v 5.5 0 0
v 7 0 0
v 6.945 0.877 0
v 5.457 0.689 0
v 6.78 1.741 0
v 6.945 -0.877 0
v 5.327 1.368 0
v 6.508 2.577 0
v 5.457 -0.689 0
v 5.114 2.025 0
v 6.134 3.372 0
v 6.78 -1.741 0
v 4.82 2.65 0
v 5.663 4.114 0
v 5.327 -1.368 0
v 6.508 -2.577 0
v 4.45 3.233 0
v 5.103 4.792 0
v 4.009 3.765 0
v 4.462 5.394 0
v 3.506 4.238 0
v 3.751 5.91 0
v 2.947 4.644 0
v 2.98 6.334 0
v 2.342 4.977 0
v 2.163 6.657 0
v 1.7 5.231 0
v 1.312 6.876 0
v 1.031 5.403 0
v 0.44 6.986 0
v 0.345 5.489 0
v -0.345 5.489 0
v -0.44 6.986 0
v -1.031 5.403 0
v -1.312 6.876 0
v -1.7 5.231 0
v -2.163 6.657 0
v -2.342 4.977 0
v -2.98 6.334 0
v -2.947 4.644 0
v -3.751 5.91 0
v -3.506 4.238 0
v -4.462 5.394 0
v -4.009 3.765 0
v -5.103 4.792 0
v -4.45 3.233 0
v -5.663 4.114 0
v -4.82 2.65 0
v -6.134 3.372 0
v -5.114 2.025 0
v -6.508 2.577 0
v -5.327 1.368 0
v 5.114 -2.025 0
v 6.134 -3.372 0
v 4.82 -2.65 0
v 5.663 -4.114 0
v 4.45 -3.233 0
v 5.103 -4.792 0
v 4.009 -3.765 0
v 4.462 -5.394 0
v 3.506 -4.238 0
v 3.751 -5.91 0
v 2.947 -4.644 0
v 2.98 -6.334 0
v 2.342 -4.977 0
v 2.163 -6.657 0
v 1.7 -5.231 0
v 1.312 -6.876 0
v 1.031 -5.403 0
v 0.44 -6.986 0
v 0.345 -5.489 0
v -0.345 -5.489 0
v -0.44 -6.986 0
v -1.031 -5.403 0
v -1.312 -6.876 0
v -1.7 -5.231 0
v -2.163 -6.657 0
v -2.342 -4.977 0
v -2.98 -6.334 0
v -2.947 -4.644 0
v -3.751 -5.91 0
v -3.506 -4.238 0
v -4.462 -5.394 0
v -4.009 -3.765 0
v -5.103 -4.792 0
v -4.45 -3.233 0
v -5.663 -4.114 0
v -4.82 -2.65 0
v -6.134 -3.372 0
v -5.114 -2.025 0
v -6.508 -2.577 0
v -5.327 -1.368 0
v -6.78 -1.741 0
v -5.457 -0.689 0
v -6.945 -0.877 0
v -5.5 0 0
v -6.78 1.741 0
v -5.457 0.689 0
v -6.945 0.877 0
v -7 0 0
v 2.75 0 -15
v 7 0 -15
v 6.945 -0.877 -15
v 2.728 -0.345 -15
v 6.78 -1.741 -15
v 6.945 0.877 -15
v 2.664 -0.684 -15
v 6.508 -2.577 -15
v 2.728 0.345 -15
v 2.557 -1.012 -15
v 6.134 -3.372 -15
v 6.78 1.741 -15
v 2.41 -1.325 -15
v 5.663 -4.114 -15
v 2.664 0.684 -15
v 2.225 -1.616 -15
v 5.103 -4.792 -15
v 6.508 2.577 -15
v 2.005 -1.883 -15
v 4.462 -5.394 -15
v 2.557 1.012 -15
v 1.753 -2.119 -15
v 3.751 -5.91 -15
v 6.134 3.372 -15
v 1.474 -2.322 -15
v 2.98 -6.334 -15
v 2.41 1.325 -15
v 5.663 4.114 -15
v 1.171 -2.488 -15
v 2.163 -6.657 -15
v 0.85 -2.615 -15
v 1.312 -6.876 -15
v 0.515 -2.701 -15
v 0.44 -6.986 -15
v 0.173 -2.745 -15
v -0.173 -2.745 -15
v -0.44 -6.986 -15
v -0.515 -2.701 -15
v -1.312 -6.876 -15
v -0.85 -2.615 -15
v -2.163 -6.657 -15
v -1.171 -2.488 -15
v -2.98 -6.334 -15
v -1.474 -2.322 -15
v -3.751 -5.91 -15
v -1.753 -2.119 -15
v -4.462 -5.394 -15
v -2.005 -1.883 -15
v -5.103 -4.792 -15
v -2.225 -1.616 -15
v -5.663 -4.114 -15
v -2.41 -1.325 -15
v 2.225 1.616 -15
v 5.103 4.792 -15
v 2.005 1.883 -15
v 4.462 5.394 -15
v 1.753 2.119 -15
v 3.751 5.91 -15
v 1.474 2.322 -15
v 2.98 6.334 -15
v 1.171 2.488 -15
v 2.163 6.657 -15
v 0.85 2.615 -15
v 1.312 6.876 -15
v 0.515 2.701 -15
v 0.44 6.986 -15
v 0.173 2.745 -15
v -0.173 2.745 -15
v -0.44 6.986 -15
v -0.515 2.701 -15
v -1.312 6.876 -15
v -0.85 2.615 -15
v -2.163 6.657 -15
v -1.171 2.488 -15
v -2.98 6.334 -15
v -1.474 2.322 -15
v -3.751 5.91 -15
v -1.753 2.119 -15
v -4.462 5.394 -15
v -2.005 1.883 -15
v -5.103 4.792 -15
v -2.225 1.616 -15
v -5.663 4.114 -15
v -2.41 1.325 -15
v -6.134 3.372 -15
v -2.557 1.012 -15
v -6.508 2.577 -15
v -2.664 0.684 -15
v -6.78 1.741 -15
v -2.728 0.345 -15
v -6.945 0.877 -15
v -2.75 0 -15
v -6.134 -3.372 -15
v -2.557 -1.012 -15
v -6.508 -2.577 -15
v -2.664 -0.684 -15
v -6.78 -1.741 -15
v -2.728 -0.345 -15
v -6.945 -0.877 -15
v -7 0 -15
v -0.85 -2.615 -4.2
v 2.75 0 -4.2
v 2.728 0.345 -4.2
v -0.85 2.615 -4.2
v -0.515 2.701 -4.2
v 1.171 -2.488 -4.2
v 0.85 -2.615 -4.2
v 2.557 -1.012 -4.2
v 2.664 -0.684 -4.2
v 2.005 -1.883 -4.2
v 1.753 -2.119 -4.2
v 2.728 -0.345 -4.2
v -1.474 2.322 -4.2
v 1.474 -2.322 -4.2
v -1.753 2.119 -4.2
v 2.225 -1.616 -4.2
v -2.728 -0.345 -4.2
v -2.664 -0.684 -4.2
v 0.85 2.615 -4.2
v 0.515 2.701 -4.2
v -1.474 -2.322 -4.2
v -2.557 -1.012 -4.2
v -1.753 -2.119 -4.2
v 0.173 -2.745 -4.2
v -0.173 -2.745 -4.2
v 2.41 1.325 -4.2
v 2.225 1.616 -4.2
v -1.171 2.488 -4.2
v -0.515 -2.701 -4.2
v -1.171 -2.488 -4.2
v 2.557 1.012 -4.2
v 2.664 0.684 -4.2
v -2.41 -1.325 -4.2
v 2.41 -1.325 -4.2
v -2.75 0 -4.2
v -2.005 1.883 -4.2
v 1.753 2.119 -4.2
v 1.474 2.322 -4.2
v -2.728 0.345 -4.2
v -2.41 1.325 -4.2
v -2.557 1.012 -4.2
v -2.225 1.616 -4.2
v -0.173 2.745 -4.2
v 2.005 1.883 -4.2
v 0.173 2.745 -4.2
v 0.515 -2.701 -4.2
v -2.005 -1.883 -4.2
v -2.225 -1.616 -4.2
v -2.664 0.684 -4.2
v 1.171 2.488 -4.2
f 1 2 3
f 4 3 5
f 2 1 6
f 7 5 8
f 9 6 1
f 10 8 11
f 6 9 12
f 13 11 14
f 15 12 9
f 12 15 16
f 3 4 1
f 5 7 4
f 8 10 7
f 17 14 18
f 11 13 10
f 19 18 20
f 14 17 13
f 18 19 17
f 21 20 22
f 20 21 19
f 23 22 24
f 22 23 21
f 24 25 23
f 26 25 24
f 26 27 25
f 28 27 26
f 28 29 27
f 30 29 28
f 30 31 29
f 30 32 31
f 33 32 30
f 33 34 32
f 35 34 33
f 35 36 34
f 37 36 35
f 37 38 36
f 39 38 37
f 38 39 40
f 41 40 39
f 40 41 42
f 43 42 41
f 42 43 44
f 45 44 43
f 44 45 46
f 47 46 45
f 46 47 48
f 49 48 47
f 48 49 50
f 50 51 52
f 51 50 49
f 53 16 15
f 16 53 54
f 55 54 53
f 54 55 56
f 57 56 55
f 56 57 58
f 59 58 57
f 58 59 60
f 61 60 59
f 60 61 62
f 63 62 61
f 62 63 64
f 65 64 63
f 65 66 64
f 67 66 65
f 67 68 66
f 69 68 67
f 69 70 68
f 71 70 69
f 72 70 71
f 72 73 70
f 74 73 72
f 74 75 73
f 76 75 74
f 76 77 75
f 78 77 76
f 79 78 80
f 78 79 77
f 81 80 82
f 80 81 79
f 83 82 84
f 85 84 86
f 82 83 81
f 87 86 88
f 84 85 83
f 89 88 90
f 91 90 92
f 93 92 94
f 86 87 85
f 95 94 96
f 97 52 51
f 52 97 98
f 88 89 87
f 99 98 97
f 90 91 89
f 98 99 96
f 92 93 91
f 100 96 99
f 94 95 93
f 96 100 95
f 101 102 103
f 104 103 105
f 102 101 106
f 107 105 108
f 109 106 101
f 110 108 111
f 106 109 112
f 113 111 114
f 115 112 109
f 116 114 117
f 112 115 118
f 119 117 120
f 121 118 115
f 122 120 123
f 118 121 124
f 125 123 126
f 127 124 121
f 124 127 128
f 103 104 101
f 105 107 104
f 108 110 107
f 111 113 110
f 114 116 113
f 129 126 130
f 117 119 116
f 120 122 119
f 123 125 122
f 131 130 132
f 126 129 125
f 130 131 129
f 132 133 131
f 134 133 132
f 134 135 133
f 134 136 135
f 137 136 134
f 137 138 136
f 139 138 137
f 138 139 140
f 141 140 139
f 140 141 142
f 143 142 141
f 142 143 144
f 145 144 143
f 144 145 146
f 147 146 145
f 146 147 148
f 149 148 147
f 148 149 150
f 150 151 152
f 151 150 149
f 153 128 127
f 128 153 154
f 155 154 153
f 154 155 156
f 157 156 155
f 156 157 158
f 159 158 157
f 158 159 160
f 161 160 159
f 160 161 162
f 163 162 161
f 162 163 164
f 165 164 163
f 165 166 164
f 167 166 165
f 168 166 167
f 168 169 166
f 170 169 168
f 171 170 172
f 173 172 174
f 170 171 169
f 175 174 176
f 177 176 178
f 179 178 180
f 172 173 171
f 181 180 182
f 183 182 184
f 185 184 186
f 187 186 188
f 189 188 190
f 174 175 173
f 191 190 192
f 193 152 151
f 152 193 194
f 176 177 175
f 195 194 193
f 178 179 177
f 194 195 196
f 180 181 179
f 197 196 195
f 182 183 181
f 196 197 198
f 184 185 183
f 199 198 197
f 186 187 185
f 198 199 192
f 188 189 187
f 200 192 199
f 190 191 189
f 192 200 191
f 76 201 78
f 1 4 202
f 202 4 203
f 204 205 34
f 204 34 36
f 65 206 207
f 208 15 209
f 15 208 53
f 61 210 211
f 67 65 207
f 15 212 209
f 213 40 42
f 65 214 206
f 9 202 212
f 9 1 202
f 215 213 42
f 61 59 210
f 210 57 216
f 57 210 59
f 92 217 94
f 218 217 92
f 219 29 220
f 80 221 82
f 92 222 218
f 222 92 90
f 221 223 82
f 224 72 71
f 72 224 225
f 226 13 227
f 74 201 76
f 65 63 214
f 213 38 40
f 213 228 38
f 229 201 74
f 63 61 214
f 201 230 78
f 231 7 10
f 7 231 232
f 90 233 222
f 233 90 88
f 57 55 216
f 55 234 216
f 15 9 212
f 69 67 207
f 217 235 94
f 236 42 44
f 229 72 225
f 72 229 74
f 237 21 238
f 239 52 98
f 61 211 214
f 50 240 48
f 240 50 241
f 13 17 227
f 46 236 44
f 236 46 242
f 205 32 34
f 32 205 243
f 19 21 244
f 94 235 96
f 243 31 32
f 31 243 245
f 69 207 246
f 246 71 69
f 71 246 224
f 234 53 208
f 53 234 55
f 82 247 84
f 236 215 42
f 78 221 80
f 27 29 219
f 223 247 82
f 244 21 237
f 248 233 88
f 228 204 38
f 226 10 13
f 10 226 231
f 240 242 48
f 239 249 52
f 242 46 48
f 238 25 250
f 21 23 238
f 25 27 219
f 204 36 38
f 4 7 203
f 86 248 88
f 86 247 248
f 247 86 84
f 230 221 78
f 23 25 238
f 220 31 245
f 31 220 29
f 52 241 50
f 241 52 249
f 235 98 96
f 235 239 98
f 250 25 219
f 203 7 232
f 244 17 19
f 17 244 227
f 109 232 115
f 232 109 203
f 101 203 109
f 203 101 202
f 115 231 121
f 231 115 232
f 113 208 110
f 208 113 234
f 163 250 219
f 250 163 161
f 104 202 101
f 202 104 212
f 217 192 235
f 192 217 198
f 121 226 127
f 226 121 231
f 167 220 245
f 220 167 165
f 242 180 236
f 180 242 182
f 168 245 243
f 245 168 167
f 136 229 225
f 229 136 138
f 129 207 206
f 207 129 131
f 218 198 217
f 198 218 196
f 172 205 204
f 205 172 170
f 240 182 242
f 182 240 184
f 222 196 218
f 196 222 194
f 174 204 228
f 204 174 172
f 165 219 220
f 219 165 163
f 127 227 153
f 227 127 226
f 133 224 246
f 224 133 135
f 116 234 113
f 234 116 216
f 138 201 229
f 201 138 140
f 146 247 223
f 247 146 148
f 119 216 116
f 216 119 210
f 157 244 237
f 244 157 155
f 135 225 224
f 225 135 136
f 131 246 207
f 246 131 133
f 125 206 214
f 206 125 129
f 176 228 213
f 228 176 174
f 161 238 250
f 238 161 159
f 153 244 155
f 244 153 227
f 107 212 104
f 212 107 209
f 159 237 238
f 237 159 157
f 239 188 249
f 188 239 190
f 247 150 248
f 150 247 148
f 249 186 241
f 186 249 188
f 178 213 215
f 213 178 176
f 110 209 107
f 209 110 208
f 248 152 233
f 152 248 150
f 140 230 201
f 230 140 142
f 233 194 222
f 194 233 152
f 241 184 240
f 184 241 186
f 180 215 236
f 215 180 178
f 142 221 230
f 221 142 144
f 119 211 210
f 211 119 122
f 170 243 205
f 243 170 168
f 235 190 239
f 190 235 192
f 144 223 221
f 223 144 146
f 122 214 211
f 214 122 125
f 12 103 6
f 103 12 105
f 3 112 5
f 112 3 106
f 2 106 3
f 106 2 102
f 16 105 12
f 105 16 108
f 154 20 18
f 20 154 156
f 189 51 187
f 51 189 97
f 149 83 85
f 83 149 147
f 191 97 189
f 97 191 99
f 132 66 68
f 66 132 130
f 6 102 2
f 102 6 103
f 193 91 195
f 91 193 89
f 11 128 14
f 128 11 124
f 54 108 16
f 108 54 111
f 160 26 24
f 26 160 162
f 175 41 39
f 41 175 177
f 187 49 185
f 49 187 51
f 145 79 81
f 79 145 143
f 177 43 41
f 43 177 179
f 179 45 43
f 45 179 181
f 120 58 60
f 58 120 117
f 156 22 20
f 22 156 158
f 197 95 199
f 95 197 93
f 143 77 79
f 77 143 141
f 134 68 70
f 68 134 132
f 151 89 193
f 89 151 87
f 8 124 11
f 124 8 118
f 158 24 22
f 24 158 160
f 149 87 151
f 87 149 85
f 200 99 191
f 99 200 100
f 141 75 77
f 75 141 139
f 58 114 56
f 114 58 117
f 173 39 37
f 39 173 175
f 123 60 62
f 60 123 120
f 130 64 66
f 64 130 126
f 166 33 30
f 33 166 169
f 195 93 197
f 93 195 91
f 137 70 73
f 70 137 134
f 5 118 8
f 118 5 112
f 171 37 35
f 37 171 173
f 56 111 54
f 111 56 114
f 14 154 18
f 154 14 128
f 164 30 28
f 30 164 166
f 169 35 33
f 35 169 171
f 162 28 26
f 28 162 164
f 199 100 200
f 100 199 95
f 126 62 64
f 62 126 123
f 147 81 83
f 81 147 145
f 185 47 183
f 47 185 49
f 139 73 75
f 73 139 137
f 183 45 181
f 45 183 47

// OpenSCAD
$fn = 50;


difference() {
	union() {
		translate(v = [0, 0, -15.0000000000]) {
			cylinder(h = 15, r = 7.0000000000);
		}
		cylinder(h = 0, r = 10.0000000000);
	}
	union() {
		translate(v = [0, 0, 0]) {
			rotate(a = [0, 0, 0]) {
				difference() {
					union() {
						#translate(v = [0, 0, -15.0000000000]) {
							cylinder(h = 15, r = 2.2500000000);
						}
						#translate(v = [0, 0, -4.2000000000]) {
							cylinder(h = 4.2000000000, r = 7.0000000000, r1 = 2.7500000000, r2 = 5.5000000000);
						}
						#translate(v = [0, 0, -15.0000000000]) {
							cylinder(h = 15, r = 2.7500000000);
						}
						#translate(v = [0, 0, -15.0000000000]) {
							cylinder(h = 15, r = 2.2500000000);
						}
					}
					union();
				}
			}
		}
	}
}
